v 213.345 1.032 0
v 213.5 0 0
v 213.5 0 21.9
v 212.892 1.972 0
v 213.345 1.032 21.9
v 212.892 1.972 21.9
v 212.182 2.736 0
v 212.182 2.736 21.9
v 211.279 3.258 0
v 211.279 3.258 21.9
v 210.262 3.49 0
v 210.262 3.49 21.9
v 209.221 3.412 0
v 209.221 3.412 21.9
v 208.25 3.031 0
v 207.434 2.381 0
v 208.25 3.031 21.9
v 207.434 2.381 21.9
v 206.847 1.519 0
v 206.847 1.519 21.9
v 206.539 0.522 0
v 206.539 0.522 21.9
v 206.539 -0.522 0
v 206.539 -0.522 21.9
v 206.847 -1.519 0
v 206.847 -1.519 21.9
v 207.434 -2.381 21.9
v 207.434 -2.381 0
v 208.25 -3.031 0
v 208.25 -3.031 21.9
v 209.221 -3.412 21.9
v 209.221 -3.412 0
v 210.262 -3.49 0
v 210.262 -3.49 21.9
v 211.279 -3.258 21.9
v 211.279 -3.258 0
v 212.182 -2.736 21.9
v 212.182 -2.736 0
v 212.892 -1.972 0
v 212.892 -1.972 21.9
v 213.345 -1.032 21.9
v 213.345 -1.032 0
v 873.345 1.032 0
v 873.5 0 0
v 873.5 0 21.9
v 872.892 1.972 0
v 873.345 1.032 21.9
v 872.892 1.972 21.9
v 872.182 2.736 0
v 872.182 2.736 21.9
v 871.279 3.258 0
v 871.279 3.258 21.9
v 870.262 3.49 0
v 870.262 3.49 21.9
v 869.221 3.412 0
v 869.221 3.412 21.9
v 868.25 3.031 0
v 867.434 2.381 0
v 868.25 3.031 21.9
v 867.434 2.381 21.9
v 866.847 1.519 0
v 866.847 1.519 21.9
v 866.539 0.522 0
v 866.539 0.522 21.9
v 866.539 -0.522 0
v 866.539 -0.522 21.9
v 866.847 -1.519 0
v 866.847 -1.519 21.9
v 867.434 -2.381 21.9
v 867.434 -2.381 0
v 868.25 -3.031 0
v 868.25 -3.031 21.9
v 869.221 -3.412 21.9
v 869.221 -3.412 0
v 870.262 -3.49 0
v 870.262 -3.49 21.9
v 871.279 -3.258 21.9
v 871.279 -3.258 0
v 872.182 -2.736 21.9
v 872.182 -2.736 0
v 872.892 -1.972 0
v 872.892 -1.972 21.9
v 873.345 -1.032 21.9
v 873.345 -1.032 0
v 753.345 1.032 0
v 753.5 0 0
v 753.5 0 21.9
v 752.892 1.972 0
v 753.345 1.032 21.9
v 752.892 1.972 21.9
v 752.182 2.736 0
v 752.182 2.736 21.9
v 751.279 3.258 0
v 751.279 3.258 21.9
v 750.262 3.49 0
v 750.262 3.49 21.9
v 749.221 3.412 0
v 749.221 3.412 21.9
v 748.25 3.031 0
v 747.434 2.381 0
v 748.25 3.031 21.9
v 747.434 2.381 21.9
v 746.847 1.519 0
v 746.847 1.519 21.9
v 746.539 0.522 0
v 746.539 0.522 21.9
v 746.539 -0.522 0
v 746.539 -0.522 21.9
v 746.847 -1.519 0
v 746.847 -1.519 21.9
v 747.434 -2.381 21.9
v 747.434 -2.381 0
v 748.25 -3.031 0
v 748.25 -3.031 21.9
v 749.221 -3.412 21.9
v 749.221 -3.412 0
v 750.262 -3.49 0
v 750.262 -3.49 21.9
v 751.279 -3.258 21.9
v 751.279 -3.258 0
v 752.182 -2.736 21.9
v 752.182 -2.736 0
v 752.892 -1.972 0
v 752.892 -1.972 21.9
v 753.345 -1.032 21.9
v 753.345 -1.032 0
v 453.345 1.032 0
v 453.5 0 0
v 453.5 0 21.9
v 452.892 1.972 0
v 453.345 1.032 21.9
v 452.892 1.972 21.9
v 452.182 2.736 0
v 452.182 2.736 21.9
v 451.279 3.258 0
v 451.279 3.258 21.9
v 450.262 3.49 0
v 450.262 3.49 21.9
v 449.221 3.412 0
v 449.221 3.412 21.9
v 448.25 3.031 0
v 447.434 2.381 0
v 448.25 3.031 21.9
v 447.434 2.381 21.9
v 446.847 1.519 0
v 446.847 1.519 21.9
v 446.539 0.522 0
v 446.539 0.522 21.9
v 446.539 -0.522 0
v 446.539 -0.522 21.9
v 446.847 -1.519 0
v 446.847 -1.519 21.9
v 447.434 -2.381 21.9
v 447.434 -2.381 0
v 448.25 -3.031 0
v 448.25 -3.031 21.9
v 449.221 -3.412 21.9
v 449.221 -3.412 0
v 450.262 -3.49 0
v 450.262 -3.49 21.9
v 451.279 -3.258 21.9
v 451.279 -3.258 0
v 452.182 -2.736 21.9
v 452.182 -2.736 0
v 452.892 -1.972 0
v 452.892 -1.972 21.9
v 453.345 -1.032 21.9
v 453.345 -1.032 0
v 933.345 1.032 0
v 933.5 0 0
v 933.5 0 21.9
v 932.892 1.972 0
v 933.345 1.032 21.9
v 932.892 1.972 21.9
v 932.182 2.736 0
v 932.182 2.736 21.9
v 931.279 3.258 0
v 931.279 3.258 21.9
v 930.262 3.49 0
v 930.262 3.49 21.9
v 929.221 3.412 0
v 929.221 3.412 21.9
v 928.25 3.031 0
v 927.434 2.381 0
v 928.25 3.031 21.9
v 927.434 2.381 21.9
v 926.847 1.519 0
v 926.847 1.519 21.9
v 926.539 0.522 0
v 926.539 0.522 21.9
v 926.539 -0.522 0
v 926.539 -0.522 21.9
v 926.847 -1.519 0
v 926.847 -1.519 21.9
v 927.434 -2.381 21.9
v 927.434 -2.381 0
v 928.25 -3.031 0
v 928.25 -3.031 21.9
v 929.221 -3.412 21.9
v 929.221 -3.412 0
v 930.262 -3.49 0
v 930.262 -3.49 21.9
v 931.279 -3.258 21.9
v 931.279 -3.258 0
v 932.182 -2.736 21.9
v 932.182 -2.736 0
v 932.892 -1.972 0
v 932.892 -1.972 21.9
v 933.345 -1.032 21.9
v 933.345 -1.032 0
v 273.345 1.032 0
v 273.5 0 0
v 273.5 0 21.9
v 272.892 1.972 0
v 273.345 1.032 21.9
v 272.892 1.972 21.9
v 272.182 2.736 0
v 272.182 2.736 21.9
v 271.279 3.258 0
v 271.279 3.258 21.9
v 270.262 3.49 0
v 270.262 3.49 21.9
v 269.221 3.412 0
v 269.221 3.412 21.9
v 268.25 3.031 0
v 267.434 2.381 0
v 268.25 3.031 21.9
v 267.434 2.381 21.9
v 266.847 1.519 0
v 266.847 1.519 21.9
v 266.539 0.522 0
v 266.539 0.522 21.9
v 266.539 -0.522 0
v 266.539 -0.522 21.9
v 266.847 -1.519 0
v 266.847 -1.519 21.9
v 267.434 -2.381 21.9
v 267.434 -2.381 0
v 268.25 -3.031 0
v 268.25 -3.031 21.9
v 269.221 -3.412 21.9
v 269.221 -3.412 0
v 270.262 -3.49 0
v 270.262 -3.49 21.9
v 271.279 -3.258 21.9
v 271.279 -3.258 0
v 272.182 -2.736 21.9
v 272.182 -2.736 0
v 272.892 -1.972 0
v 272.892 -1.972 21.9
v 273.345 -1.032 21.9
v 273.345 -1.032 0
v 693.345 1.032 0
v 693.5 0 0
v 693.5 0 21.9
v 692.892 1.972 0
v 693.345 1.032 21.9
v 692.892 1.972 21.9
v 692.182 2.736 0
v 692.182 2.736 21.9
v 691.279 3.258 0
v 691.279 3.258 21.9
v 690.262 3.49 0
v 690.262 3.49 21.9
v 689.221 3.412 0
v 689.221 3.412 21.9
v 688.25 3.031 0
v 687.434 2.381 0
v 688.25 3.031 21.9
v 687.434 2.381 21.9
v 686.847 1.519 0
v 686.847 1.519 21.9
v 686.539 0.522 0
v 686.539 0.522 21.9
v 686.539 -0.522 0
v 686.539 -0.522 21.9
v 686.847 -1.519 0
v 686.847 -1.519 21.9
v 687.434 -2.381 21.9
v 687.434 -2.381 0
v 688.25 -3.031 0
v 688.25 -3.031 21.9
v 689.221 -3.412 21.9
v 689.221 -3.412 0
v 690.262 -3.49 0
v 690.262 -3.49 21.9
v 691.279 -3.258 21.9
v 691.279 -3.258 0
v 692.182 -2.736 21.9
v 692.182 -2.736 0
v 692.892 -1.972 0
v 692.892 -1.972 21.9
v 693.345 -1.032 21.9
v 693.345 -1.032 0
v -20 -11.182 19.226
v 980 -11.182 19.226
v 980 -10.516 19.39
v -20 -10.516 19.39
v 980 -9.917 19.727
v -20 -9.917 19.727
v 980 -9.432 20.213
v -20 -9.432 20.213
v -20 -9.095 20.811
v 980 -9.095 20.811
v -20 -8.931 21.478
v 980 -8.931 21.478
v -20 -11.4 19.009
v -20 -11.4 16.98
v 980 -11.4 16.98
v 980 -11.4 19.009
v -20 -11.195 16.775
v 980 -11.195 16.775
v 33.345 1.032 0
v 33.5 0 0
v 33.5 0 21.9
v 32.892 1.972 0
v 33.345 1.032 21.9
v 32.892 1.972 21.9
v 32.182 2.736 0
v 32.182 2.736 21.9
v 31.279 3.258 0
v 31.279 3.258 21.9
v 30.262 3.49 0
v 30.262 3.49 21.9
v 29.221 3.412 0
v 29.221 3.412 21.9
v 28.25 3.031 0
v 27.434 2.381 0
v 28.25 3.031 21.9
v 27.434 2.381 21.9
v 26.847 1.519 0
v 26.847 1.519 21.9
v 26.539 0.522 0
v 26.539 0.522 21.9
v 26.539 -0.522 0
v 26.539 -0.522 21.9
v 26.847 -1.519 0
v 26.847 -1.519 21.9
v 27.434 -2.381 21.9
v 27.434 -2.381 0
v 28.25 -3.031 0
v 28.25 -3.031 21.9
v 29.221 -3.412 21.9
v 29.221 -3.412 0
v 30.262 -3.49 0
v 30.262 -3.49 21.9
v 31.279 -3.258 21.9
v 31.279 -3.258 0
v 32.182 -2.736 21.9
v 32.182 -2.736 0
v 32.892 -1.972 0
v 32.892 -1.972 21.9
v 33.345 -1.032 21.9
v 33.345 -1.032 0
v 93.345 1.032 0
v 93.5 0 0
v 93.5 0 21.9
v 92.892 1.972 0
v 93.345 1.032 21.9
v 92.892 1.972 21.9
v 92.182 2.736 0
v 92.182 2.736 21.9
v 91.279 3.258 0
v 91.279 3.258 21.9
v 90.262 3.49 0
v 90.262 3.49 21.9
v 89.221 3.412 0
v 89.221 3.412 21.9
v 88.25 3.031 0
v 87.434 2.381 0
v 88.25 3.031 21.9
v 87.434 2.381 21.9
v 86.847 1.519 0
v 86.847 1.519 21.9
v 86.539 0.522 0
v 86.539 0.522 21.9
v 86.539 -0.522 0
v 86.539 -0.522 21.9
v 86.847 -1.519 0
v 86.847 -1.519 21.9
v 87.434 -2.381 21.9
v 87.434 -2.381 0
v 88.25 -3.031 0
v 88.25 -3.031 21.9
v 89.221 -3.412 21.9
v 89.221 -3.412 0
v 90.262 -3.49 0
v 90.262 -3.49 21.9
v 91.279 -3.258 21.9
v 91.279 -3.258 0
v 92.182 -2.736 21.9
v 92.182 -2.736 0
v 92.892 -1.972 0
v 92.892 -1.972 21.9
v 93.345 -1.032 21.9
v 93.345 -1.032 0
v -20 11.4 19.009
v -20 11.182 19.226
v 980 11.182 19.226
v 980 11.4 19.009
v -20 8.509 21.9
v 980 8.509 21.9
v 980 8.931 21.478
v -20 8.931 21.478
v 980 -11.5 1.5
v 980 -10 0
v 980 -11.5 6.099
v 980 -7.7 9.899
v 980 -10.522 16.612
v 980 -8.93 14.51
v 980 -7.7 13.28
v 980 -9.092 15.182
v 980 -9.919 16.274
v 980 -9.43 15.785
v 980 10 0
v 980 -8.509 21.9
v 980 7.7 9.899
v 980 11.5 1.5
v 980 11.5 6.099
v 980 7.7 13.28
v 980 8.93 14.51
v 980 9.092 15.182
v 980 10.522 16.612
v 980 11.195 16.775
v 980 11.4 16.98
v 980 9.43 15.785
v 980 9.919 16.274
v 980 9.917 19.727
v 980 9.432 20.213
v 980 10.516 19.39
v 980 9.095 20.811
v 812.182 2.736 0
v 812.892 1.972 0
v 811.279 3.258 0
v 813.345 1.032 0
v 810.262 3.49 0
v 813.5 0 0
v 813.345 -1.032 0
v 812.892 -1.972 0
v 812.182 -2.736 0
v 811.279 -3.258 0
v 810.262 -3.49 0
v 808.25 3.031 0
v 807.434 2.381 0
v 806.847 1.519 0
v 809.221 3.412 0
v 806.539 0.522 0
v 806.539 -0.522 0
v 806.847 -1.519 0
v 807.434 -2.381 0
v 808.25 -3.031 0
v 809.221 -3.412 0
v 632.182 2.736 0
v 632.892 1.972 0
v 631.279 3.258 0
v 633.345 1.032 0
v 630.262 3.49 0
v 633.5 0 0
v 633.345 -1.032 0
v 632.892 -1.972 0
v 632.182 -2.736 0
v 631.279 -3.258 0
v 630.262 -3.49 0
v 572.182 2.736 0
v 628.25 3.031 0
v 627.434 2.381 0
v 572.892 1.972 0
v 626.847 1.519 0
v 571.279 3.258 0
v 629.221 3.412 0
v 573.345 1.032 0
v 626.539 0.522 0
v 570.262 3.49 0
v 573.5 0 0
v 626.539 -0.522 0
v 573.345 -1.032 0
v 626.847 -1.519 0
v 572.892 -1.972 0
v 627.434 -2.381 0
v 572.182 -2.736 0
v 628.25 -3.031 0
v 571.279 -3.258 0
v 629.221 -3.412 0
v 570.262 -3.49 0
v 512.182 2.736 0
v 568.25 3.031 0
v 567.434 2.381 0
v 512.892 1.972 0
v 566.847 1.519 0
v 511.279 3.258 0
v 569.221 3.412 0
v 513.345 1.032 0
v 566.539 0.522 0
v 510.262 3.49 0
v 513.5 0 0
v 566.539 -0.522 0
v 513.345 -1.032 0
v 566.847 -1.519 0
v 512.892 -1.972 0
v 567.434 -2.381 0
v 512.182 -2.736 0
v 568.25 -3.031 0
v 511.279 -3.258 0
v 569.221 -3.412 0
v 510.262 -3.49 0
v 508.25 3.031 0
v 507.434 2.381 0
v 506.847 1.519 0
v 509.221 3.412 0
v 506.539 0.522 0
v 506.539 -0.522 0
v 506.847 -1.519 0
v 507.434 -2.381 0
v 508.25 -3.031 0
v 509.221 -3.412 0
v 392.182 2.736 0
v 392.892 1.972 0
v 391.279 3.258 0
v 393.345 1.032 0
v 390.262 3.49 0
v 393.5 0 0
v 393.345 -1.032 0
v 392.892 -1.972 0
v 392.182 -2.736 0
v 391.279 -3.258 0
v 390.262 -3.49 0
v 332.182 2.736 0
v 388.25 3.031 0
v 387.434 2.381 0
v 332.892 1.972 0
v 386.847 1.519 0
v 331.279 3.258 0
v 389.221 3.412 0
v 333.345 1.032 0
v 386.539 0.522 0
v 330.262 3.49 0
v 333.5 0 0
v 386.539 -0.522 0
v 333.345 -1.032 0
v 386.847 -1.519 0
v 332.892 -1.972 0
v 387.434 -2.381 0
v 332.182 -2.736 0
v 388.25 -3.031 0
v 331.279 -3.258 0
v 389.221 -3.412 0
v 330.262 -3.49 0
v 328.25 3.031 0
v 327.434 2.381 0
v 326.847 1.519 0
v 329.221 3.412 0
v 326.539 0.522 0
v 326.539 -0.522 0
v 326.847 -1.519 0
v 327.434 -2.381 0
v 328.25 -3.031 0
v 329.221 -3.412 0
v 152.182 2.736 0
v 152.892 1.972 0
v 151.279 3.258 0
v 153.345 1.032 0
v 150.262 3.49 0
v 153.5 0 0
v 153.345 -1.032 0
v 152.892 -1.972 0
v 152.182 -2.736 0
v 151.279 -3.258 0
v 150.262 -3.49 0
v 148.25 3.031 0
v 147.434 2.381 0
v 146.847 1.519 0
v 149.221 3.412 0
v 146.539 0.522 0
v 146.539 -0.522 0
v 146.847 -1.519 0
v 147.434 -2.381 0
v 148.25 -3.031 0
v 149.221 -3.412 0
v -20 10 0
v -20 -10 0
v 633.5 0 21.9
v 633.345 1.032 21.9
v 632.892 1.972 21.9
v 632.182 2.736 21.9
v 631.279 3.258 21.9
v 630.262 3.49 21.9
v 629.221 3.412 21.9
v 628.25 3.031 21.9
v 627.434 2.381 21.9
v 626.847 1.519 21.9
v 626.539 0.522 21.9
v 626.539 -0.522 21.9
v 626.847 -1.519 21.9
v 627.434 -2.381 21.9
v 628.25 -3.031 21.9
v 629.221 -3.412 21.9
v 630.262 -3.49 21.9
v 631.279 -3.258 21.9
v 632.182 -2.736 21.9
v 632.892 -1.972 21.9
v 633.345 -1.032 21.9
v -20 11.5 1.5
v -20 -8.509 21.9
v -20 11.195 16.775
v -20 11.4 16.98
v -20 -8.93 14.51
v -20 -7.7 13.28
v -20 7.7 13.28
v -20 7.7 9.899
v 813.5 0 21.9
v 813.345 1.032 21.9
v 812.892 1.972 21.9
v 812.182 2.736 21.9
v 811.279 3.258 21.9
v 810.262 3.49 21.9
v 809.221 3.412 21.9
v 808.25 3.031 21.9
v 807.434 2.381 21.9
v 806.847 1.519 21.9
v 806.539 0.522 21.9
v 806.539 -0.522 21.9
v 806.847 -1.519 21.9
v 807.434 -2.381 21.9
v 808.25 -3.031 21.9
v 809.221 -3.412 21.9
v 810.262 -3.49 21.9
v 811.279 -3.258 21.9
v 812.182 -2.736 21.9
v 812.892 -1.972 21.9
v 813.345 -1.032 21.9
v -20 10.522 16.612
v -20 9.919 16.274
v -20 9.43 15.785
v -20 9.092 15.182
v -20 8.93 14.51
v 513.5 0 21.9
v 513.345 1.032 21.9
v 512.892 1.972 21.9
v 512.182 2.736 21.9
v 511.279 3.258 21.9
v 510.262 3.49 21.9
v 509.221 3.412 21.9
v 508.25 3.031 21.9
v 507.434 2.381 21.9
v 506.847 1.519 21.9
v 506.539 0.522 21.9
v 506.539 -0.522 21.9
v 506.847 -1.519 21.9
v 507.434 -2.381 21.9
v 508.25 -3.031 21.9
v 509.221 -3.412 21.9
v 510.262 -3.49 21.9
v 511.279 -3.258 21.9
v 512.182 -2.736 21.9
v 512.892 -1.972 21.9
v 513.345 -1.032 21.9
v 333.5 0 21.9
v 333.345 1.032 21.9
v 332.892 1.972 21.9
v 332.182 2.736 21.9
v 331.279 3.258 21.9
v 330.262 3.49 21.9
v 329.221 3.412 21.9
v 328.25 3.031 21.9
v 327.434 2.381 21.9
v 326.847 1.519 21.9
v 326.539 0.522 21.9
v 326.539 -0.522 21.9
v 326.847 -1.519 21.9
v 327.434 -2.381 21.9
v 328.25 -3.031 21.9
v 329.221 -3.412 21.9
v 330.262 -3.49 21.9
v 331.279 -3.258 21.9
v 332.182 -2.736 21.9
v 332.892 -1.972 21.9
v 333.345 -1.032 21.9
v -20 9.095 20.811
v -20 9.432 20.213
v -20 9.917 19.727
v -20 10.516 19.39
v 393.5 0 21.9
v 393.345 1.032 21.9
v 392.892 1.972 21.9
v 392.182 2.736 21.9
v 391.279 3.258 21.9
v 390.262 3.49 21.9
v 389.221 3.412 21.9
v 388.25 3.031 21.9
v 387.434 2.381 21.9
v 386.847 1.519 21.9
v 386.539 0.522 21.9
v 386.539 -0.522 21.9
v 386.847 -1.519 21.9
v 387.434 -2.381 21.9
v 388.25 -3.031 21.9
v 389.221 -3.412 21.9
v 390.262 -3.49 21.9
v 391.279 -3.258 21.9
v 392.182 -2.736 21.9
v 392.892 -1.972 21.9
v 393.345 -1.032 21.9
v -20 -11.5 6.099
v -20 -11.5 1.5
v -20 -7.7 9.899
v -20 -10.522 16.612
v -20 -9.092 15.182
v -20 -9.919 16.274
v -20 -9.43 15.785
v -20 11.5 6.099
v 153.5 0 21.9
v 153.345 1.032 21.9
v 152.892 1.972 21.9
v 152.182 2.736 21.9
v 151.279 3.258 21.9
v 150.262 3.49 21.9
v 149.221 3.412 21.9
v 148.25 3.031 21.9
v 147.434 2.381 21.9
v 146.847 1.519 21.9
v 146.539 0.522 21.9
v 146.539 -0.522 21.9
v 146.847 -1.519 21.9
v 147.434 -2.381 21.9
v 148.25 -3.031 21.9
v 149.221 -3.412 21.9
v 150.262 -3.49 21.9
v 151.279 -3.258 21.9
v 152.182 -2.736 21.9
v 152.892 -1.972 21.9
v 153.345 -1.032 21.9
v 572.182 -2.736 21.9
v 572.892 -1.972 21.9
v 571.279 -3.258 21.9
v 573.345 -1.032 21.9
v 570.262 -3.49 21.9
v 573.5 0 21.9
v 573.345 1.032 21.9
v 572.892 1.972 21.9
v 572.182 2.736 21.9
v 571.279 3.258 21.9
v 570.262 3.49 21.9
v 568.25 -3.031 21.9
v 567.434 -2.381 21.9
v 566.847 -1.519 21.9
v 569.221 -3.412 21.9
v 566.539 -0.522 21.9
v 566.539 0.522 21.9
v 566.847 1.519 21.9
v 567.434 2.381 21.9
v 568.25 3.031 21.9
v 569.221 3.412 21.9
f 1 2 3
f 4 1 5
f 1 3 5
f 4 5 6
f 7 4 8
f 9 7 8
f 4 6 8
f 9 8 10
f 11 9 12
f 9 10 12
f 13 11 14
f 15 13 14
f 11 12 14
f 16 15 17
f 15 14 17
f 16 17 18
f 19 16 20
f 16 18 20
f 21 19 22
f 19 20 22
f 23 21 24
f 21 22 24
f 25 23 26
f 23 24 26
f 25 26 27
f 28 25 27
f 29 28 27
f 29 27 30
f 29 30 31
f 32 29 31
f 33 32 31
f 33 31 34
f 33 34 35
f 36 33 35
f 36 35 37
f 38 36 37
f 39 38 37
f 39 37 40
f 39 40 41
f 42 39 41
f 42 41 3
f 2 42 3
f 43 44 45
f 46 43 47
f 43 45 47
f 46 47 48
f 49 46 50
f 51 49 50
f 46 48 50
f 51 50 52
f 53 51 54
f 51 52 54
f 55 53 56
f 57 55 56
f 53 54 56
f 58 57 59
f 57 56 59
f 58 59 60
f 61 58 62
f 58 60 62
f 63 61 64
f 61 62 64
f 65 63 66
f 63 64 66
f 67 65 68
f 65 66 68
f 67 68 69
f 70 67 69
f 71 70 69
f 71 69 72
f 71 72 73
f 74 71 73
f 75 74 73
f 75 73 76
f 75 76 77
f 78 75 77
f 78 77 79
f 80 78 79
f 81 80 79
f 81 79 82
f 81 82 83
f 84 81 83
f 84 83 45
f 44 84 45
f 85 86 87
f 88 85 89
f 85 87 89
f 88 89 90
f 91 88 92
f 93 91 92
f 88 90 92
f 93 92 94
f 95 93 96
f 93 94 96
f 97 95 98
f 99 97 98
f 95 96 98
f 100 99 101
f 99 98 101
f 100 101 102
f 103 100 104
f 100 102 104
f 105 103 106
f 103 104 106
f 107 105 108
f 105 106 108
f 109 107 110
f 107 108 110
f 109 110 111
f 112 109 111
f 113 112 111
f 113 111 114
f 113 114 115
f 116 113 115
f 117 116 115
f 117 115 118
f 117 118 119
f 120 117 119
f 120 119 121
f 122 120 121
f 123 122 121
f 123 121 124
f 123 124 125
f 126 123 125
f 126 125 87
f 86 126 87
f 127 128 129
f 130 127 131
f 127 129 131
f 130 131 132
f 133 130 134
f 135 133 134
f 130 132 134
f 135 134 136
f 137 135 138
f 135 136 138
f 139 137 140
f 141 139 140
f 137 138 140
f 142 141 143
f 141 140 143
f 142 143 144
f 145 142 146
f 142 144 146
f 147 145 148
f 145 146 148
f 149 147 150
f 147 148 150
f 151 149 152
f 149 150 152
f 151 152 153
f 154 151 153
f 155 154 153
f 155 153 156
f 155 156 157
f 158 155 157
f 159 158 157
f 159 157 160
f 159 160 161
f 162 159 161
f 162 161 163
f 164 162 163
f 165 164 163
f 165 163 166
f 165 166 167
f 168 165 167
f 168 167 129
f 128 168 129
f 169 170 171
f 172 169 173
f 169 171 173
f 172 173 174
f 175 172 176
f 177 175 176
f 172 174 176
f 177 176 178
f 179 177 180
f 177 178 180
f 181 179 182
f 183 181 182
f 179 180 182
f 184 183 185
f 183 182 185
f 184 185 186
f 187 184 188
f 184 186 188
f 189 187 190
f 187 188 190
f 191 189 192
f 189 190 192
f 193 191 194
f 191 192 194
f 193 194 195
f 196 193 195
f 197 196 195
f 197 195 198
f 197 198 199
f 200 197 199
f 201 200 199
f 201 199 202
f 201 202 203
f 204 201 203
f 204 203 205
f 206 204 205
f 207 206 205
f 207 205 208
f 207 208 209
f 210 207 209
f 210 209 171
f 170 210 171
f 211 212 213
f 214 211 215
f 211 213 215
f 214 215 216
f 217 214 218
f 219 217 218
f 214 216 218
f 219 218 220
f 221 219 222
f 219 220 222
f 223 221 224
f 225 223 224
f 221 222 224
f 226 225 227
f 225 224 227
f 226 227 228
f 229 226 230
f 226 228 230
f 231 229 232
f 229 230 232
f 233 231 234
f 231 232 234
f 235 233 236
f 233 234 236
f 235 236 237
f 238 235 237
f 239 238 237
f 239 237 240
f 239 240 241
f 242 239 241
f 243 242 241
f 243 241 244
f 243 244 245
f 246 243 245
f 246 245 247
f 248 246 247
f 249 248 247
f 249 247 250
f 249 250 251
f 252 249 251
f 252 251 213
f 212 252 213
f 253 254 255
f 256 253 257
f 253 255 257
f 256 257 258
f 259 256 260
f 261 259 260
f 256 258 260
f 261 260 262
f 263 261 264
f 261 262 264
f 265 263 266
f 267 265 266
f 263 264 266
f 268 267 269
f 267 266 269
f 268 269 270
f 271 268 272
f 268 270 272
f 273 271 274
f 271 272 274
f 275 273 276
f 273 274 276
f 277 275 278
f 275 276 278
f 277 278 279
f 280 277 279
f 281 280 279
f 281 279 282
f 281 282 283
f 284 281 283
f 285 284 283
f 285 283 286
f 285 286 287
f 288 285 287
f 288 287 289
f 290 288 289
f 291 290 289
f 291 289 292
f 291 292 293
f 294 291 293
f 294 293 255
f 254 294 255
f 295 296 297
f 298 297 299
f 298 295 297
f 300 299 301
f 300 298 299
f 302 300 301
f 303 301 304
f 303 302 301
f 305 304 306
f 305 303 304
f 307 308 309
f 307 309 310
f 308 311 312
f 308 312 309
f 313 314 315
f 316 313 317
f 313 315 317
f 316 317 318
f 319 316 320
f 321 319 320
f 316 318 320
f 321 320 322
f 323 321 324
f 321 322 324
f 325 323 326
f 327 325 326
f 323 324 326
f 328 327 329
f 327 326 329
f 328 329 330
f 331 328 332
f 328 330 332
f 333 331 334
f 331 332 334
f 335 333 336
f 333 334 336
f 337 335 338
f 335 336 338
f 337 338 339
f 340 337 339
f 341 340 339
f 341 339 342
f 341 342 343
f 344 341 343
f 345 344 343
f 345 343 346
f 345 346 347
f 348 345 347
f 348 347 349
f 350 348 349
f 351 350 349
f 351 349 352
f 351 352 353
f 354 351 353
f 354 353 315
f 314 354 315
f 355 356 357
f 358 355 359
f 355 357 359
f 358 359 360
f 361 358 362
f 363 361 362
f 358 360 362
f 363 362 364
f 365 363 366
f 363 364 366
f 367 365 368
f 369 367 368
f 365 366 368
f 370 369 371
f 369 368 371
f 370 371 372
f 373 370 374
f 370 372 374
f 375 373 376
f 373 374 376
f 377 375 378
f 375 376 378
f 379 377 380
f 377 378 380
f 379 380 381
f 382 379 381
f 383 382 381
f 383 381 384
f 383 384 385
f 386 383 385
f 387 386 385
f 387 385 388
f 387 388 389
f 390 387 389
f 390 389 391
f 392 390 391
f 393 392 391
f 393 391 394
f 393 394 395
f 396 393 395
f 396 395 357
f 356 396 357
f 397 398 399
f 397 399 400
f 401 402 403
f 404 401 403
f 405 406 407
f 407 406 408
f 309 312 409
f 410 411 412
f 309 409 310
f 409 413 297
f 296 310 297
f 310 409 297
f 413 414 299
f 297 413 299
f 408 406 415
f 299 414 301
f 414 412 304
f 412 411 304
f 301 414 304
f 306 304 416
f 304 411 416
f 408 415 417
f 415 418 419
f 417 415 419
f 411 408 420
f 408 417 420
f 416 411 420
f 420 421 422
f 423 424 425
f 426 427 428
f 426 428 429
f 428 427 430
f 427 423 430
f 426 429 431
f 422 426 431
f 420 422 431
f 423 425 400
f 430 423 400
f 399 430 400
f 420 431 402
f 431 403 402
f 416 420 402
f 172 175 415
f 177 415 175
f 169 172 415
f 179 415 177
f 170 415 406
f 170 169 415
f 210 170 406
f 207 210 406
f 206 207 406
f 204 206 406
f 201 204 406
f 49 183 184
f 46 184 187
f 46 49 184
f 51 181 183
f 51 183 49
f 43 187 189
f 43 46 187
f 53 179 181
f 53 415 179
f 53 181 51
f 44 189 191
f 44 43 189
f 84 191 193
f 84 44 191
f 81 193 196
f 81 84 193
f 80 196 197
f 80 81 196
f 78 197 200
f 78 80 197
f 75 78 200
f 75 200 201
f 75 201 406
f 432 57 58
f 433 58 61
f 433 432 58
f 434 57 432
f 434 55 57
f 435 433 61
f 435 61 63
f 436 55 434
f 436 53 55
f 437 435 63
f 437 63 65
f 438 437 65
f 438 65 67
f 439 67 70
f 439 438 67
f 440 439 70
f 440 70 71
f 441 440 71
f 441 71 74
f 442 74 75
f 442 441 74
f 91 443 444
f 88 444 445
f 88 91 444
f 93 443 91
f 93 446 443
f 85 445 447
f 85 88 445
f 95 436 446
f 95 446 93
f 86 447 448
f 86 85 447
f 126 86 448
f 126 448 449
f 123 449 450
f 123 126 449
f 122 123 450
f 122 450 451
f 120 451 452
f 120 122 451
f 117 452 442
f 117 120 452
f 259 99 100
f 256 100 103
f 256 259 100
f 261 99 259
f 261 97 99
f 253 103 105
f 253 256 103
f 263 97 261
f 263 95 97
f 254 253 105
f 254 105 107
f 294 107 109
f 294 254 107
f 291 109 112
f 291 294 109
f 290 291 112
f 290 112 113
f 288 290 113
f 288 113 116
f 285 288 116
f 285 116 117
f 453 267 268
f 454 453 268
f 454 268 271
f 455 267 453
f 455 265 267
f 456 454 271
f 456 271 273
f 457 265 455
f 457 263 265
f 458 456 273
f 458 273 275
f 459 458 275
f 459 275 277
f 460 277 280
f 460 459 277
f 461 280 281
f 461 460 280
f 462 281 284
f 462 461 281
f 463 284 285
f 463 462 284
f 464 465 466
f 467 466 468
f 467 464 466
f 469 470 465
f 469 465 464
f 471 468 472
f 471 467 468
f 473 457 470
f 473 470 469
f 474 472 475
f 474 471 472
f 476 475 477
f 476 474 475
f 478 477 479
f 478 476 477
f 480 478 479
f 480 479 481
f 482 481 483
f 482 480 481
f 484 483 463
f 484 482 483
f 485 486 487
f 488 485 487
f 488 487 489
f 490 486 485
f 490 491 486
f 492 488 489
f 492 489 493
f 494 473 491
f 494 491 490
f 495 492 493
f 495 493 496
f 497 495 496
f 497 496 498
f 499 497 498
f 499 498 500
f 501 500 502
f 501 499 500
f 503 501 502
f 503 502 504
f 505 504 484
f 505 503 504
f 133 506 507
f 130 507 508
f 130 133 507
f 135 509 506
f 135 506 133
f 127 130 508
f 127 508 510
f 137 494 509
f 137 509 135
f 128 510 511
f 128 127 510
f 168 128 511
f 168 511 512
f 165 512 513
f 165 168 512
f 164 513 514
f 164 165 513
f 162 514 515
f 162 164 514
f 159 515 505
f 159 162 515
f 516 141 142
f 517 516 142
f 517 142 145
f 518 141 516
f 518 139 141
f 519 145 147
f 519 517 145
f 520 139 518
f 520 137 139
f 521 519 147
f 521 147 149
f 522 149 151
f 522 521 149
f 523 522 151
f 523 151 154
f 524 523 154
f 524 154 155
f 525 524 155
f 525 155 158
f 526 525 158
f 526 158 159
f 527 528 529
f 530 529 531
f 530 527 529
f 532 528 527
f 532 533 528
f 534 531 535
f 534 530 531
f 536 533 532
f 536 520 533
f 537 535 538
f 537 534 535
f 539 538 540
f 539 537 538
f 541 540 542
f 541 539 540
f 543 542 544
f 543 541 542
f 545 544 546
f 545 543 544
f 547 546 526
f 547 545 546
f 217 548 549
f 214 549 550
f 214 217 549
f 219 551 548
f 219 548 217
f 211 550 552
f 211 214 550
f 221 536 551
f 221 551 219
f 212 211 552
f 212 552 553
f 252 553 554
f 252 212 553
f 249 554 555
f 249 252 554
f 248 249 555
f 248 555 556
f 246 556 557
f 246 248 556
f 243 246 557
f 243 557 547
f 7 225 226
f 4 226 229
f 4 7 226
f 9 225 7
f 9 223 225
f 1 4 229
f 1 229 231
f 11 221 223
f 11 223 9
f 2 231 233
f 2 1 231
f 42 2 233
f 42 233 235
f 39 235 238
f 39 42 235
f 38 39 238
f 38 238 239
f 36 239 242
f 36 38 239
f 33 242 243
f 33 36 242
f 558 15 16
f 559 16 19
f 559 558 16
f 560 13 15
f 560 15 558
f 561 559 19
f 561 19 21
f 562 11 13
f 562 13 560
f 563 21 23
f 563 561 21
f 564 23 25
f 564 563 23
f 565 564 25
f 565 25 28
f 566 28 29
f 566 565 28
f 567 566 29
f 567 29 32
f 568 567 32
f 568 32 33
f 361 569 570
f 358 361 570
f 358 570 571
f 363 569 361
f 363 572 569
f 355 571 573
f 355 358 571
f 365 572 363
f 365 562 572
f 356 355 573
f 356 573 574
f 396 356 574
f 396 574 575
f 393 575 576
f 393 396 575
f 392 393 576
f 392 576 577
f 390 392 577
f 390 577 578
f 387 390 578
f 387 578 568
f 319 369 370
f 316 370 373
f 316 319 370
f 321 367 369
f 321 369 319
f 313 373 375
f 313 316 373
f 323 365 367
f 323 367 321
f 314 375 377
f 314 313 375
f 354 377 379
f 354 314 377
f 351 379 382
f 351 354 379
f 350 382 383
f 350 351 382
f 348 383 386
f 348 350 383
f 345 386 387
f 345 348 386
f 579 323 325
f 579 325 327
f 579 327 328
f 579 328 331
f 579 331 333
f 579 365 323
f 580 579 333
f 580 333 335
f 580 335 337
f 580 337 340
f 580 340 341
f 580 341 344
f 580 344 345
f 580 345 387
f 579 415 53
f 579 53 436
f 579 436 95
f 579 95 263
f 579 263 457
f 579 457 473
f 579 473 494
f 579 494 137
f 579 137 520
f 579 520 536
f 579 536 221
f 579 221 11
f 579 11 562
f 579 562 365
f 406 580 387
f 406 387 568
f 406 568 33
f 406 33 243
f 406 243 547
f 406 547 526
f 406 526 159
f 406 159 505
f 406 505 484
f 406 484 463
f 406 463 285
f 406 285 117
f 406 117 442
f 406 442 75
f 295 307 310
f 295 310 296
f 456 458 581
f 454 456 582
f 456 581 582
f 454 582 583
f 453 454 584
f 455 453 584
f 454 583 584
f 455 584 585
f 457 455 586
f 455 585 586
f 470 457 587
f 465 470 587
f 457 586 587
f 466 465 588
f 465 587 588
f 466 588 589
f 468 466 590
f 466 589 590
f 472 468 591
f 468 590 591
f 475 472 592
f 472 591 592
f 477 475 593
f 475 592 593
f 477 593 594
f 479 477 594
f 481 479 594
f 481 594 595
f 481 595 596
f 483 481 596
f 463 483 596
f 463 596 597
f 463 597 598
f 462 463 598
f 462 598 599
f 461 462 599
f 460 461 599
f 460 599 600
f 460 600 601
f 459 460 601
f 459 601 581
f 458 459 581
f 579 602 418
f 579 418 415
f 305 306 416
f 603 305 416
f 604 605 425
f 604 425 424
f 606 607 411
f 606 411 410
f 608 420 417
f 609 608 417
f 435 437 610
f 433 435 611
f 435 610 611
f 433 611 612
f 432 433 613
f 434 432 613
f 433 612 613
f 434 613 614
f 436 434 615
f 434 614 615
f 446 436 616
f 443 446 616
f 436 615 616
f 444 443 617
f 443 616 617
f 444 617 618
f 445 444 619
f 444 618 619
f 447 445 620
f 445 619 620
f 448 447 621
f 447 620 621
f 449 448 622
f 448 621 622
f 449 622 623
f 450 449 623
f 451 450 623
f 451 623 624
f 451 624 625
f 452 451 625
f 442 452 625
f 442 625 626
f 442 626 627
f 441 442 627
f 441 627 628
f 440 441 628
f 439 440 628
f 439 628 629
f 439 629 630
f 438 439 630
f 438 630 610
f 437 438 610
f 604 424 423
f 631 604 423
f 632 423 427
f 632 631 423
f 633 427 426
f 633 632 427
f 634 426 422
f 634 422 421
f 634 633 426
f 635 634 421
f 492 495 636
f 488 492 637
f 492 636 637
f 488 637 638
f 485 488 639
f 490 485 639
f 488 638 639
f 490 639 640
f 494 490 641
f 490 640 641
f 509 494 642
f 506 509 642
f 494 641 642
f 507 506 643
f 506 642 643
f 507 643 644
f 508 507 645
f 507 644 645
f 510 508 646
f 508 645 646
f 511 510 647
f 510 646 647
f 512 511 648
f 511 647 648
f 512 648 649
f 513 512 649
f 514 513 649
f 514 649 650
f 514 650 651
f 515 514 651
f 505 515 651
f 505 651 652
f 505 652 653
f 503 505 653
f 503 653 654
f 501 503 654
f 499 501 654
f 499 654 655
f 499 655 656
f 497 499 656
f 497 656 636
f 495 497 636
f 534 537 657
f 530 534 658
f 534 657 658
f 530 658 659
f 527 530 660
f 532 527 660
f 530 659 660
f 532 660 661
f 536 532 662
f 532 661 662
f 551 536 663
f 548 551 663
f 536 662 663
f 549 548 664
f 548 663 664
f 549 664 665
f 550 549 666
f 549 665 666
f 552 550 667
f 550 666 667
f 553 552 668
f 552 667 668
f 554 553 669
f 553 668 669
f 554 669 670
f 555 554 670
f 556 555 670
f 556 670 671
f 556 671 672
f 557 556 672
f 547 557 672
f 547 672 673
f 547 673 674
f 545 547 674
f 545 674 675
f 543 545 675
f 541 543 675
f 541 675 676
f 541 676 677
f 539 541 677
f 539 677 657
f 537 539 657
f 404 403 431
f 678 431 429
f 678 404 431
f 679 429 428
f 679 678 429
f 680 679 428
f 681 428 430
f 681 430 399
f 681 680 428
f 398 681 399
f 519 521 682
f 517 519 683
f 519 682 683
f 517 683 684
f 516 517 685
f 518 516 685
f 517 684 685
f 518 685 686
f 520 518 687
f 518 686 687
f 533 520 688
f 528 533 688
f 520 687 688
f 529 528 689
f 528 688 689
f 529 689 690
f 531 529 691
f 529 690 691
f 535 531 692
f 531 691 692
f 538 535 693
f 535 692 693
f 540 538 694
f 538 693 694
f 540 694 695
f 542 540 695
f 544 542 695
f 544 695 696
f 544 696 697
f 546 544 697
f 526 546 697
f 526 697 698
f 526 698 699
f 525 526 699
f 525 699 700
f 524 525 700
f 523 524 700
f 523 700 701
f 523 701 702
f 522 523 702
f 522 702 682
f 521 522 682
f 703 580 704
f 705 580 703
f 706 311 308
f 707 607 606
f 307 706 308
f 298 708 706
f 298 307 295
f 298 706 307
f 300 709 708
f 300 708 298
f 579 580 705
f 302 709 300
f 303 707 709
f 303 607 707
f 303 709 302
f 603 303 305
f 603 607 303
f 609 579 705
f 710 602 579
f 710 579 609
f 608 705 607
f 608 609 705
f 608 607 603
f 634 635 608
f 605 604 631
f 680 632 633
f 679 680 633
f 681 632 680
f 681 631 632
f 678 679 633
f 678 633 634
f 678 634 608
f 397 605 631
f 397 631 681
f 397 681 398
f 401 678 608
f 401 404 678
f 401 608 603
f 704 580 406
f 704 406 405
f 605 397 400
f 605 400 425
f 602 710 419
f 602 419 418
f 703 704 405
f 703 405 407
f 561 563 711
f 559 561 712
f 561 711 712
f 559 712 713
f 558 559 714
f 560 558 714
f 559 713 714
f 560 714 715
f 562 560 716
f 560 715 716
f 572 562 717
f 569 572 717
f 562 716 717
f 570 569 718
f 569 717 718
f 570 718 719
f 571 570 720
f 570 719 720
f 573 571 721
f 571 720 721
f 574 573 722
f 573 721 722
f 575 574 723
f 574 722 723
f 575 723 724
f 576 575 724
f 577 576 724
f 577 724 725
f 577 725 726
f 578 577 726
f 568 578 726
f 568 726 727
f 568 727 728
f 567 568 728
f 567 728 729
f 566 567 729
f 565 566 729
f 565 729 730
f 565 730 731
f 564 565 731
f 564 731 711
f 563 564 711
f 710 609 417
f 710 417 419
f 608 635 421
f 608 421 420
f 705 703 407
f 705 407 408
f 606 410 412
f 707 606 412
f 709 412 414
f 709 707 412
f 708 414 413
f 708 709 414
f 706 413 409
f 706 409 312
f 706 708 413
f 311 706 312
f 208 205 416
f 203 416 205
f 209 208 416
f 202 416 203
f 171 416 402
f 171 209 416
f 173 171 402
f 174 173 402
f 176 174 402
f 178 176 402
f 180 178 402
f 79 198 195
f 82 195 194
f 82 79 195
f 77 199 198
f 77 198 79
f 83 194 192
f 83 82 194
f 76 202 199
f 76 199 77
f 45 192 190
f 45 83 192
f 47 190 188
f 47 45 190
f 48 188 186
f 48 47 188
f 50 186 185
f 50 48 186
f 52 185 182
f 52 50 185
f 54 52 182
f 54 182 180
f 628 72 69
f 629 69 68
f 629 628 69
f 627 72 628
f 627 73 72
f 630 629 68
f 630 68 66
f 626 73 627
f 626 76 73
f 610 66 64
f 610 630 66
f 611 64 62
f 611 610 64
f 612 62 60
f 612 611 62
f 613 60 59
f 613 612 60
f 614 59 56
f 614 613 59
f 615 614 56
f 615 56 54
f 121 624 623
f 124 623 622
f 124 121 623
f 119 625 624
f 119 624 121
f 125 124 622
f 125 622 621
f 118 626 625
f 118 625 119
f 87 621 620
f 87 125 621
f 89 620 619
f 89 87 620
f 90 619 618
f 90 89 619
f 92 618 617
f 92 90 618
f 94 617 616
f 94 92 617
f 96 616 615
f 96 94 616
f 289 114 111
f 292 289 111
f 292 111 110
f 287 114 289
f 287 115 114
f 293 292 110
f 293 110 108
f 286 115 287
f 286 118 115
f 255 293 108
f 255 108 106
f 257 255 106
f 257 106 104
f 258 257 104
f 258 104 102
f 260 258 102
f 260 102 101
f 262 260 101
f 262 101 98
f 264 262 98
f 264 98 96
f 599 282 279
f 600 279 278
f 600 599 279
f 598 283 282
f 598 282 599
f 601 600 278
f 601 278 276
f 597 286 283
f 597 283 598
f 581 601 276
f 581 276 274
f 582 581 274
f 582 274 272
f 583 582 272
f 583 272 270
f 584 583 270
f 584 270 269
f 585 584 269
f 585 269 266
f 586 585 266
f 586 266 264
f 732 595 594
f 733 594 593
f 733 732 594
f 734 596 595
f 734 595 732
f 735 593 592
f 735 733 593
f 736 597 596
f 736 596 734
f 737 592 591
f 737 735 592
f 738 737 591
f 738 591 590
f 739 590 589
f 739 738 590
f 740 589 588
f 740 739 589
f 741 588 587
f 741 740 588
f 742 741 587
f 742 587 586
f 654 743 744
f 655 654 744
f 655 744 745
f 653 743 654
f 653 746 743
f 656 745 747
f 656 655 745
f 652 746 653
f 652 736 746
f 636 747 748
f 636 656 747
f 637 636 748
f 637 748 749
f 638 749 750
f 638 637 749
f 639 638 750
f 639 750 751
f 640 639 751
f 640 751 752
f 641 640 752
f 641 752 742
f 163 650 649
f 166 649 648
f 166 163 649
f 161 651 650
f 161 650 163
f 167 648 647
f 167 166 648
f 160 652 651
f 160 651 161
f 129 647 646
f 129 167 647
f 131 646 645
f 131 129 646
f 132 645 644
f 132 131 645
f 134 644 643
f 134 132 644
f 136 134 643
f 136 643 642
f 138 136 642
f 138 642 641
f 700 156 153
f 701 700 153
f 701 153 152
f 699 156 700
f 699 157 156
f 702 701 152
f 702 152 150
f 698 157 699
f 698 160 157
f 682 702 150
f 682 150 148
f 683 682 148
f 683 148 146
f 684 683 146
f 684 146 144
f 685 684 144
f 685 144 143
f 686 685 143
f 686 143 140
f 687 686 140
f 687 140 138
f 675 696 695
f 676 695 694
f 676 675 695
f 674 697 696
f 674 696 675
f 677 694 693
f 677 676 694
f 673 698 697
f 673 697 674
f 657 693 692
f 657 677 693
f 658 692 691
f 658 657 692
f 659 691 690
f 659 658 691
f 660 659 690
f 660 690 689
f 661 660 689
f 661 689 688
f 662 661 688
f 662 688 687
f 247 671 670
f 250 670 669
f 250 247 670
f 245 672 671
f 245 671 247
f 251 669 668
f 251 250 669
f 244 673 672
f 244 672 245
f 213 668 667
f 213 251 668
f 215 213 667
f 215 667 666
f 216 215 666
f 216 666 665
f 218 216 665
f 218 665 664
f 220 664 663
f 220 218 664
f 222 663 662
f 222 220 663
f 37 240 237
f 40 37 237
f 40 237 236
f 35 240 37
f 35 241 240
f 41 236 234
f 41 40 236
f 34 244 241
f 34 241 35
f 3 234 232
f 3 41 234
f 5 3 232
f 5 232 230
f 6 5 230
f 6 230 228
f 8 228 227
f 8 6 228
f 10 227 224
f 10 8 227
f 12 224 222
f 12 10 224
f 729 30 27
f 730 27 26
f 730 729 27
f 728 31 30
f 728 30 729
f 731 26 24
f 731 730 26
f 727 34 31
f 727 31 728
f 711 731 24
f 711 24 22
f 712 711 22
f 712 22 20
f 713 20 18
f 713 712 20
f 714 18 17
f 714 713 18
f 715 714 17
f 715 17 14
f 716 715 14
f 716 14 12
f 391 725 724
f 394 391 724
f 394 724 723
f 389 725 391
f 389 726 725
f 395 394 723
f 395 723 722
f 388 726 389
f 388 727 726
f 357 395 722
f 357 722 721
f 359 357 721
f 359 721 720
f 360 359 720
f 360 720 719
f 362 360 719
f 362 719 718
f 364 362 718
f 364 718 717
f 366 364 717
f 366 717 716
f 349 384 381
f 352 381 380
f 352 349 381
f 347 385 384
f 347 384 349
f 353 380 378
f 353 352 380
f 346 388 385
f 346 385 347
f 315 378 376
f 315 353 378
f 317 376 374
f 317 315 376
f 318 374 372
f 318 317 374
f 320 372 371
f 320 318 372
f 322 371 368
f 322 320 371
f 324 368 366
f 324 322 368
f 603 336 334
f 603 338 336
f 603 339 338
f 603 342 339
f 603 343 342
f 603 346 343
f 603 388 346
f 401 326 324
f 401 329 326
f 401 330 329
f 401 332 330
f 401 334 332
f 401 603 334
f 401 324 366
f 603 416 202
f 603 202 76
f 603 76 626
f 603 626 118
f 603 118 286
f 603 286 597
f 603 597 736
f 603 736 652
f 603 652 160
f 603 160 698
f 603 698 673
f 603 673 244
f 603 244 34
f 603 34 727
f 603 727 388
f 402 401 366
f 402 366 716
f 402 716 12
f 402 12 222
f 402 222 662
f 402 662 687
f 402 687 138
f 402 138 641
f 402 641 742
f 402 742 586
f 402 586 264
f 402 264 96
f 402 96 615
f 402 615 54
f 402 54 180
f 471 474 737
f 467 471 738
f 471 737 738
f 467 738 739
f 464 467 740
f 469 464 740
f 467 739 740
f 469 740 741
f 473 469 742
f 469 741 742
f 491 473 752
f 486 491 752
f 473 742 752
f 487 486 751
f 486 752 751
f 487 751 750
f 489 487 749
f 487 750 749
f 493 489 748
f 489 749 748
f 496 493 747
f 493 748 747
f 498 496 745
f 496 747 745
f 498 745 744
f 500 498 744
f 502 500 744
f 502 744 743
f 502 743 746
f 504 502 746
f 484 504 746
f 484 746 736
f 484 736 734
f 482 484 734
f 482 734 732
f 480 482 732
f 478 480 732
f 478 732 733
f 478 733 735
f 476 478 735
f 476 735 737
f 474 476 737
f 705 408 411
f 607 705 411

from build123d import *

# Parameters (mm, degrees)
RESSALTO_EXTRUS_O1_DEPTH = 1000
ESBO_O2_R                = 3.5
CORTE_EXTRUS_O1_DEPTH    = 981.312123765


# Read off the part's stored shape, not the designer's step: KR25-N.step
with BuildPart() as part:
    # Esboço1 → Ressalto-extrusão1 (new body)
    with BuildSketch(Plane.ZY.offset(20)):
        with BuildLine():
            Line((0, 10), (0, -10))
            Line((0, -10), (1.5, -11.5))
            Line((1.5, -11.5), (6.0986495, -11.5))
            Line((6.0986495, -11.5), (9.898648987, -7.7))
            Line((9.898648987, -7.7), (13.280138132, -7.7))
            Line((13.280138132, -7.7), (14.509842724, -8.929704991))
            ThreePointArc((14.509842724, -8.929704991), (16.046259432, -9.658087148), (16.774641091, -11.194504091))
            Line((16.774641091, -11.194504091), (16.980137, -11.4))
            Line((16.980137, -11.4), (19.008698, -11.4))
            Line((19.008698, -11.4), (19.226365837, -11.182332163))
            ThreePointArc((19.226365837, -11.182332163), (19.953497116, -9.6580866), (21.477742889, -8.93095576))
            Line((21.477742889, -8.93095576), (21.9, -8.508698852))
            Line((21.9, -8.508698852), (21.9, 8.508698852))
            Line((21.9, 8.508698852), (21.477742889, 8.93095576))
            ThreePointArc((21.477742889, 8.93095576), (19.953497116, 9.6580866), (19.226365837, 11.182332163))
            Line((19.226365837, 11.182332163), (19.008698, 11.4))
            Line((19.008698, 11.4), (16.980137, 11.4))
            Line((16.980137, 11.4), (16.774641091, 11.194504091))
            ThreePointArc((16.774641091, 11.194504091), (16.046259432, 9.658087148), (14.509842724, 8.929704991))
            Line((14.509842724, 8.929704991), (13.280138132, 7.7))
            Line((13.280138132, 7.7), (9.898648987, 7.7))
            Line((9.898648987, 7.7), (6.0986495, 11.5))
            Line((6.0986495, 11.5), (1.5, 11.5))
            Line((1.5, 11.5), (0, 10))
        make_face()
    extrude(amount=-RESSALTO_EXTRUS_O1_DEPTH)

    # Esboço2 → Corte-extrusão1 (cut, through all)
    with BuildSketch(Plane.XY.offset(21.9)):
        with Locations((30, 0)):
            Circle(ESBO_O2_R)
        with Locations((90, 0)):
            Circle(ESBO_O2_R)
        with Locations((150, 0)):
            Circle(ESBO_O2_R)
        with Locations((210, 0)):
            Circle(ESBO_O2_R)
        with Locations((270, 0)):
            Circle(ESBO_O2_R)
        with Locations((330, 0)):
            Circle(ESBO_O2_R)
        with Locations((390, 0)):
            Circle(ESBO_O2_R)
        with Locations((450, 0)):
            Circle(ESBO_O2_R)
        with Locations((510, 0)):
            Circle(ESBO_O2_R)
        with Locations((570, 0)):
            Circle(ESBO_O2_R)
        with Locations((630, 0)):
            Circle(ESBO_O2_R)
        with Locations((690, 0)):
            Circle(ESBO_O2_R)
        with Locations((750, 0)):
            Circle(ESBO_O2_R)
        with Locations((810, 0)):
            Circle(ESBO_O2_R)
        with Locations((870, 0)):
            Circle(ESBO_O2_R)
        with Locations((930, 0)):
            Circle(ESBO_O2_R)
    extrude(amount=-CORTE_EXTRUS_O1_DEPTH, mode=Mode.SUBTRACT)


solid = part.part
